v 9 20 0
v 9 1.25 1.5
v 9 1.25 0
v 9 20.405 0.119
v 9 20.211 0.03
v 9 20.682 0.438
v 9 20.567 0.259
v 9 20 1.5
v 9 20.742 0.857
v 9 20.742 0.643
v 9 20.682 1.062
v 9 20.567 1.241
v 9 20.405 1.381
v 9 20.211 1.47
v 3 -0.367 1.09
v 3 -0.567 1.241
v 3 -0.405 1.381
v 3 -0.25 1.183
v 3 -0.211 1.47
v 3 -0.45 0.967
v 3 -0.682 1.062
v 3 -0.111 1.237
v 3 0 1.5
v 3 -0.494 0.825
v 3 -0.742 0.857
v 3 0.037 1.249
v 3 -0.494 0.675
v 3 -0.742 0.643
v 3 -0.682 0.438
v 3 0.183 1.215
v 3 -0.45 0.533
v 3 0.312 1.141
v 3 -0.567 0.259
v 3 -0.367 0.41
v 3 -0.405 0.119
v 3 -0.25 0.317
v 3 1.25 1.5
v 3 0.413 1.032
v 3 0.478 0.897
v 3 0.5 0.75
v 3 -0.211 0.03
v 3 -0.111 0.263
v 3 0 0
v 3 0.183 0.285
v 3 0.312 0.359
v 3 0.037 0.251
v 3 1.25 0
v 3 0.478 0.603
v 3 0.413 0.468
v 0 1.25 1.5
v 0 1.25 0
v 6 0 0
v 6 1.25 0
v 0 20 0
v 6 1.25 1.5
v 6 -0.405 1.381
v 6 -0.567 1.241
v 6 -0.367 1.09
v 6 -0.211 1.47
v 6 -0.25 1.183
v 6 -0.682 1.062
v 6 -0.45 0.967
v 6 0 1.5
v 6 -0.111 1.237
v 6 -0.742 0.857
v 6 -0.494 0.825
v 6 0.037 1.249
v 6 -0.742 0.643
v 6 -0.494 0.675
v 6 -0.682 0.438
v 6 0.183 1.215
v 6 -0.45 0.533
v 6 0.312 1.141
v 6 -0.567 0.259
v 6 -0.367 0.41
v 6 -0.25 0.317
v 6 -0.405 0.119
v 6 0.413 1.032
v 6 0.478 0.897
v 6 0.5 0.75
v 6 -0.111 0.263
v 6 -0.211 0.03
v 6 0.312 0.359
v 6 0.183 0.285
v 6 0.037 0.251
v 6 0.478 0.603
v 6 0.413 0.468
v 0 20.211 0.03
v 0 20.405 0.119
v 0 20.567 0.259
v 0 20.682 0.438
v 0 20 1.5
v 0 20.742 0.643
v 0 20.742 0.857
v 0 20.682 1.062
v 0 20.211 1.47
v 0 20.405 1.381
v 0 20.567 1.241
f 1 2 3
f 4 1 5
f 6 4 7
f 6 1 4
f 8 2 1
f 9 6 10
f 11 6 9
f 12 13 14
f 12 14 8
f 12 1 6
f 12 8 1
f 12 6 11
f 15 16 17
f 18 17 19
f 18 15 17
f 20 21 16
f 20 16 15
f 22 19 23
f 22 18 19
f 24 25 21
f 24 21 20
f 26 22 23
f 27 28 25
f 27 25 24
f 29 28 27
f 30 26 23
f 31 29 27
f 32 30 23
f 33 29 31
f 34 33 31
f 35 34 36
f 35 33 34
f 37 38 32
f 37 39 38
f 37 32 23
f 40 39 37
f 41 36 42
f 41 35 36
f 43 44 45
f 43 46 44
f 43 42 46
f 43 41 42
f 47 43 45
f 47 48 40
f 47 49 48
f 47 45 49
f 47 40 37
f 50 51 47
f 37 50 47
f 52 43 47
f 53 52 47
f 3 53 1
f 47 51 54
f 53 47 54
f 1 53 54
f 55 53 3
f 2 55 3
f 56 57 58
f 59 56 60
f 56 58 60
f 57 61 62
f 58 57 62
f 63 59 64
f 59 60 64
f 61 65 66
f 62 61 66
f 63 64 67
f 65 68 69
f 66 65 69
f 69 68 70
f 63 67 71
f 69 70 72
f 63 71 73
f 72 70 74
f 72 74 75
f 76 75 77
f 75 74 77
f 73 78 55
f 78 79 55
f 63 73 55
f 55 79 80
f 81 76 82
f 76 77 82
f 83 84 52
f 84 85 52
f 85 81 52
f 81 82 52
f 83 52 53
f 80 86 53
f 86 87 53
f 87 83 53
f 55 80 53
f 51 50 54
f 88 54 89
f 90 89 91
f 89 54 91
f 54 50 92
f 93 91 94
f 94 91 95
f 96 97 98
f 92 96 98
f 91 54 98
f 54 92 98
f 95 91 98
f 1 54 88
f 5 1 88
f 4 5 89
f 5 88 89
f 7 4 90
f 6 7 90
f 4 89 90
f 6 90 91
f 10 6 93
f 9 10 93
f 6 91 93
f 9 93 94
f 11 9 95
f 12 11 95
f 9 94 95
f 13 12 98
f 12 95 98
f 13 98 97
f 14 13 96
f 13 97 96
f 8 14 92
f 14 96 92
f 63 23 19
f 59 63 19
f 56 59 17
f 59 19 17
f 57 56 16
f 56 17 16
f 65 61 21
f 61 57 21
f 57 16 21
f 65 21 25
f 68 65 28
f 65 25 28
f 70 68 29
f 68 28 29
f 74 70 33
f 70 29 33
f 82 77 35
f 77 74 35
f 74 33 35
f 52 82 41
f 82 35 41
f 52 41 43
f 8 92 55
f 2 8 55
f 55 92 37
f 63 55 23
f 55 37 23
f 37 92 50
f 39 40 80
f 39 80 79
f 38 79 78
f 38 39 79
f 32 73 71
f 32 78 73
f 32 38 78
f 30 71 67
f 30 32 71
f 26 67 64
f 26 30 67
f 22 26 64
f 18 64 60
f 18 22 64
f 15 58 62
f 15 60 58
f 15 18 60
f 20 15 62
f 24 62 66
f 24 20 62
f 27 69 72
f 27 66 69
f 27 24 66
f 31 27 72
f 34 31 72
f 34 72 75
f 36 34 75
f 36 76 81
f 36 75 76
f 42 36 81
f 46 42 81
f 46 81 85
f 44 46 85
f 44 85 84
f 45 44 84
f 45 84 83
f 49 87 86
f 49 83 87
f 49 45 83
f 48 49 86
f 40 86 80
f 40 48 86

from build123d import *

# Parameters (mm, degrees)
F0_R     = 0.5
F1_DEPTH = 9
F2_W     = 3
F2_H     = 2
F3_DEPTH = 1.501


with BuildPart() as f1:
    # F0 (on Right) → F1 (new body)
    with BuildSketch(Plane.YZ):
        with BuildLine():
            ThreePointArc((0, 1.5), (-0.75, 0.75), (0, 0))
            Line((0, 0), (20, 0))
            ThreePointArc((20, 0), (20.75, 0.75), (20, 1.5))
            Line((20, 1.5), (0, 1.5))
        make_face()
        with Locations((0, 0.75)):
            Circle(F0_R, mode=Mode.SUBTRACT)
    extrude(amount=F1_DEPTH)

    # F2 (on Top) → F3 (cut, through all)
    with BuildSketch(Plane.XY):
        with Locations((1.5, 0.25)):
            Rectangle(F2_W, F2_H)
        with Locations((7.5, 0.25)):
            Rectangle(F2_W, F2_H)
    extrude(amount=F3_DEPTH, mode=Mode.SUBTRACT)


solid = f1.part
